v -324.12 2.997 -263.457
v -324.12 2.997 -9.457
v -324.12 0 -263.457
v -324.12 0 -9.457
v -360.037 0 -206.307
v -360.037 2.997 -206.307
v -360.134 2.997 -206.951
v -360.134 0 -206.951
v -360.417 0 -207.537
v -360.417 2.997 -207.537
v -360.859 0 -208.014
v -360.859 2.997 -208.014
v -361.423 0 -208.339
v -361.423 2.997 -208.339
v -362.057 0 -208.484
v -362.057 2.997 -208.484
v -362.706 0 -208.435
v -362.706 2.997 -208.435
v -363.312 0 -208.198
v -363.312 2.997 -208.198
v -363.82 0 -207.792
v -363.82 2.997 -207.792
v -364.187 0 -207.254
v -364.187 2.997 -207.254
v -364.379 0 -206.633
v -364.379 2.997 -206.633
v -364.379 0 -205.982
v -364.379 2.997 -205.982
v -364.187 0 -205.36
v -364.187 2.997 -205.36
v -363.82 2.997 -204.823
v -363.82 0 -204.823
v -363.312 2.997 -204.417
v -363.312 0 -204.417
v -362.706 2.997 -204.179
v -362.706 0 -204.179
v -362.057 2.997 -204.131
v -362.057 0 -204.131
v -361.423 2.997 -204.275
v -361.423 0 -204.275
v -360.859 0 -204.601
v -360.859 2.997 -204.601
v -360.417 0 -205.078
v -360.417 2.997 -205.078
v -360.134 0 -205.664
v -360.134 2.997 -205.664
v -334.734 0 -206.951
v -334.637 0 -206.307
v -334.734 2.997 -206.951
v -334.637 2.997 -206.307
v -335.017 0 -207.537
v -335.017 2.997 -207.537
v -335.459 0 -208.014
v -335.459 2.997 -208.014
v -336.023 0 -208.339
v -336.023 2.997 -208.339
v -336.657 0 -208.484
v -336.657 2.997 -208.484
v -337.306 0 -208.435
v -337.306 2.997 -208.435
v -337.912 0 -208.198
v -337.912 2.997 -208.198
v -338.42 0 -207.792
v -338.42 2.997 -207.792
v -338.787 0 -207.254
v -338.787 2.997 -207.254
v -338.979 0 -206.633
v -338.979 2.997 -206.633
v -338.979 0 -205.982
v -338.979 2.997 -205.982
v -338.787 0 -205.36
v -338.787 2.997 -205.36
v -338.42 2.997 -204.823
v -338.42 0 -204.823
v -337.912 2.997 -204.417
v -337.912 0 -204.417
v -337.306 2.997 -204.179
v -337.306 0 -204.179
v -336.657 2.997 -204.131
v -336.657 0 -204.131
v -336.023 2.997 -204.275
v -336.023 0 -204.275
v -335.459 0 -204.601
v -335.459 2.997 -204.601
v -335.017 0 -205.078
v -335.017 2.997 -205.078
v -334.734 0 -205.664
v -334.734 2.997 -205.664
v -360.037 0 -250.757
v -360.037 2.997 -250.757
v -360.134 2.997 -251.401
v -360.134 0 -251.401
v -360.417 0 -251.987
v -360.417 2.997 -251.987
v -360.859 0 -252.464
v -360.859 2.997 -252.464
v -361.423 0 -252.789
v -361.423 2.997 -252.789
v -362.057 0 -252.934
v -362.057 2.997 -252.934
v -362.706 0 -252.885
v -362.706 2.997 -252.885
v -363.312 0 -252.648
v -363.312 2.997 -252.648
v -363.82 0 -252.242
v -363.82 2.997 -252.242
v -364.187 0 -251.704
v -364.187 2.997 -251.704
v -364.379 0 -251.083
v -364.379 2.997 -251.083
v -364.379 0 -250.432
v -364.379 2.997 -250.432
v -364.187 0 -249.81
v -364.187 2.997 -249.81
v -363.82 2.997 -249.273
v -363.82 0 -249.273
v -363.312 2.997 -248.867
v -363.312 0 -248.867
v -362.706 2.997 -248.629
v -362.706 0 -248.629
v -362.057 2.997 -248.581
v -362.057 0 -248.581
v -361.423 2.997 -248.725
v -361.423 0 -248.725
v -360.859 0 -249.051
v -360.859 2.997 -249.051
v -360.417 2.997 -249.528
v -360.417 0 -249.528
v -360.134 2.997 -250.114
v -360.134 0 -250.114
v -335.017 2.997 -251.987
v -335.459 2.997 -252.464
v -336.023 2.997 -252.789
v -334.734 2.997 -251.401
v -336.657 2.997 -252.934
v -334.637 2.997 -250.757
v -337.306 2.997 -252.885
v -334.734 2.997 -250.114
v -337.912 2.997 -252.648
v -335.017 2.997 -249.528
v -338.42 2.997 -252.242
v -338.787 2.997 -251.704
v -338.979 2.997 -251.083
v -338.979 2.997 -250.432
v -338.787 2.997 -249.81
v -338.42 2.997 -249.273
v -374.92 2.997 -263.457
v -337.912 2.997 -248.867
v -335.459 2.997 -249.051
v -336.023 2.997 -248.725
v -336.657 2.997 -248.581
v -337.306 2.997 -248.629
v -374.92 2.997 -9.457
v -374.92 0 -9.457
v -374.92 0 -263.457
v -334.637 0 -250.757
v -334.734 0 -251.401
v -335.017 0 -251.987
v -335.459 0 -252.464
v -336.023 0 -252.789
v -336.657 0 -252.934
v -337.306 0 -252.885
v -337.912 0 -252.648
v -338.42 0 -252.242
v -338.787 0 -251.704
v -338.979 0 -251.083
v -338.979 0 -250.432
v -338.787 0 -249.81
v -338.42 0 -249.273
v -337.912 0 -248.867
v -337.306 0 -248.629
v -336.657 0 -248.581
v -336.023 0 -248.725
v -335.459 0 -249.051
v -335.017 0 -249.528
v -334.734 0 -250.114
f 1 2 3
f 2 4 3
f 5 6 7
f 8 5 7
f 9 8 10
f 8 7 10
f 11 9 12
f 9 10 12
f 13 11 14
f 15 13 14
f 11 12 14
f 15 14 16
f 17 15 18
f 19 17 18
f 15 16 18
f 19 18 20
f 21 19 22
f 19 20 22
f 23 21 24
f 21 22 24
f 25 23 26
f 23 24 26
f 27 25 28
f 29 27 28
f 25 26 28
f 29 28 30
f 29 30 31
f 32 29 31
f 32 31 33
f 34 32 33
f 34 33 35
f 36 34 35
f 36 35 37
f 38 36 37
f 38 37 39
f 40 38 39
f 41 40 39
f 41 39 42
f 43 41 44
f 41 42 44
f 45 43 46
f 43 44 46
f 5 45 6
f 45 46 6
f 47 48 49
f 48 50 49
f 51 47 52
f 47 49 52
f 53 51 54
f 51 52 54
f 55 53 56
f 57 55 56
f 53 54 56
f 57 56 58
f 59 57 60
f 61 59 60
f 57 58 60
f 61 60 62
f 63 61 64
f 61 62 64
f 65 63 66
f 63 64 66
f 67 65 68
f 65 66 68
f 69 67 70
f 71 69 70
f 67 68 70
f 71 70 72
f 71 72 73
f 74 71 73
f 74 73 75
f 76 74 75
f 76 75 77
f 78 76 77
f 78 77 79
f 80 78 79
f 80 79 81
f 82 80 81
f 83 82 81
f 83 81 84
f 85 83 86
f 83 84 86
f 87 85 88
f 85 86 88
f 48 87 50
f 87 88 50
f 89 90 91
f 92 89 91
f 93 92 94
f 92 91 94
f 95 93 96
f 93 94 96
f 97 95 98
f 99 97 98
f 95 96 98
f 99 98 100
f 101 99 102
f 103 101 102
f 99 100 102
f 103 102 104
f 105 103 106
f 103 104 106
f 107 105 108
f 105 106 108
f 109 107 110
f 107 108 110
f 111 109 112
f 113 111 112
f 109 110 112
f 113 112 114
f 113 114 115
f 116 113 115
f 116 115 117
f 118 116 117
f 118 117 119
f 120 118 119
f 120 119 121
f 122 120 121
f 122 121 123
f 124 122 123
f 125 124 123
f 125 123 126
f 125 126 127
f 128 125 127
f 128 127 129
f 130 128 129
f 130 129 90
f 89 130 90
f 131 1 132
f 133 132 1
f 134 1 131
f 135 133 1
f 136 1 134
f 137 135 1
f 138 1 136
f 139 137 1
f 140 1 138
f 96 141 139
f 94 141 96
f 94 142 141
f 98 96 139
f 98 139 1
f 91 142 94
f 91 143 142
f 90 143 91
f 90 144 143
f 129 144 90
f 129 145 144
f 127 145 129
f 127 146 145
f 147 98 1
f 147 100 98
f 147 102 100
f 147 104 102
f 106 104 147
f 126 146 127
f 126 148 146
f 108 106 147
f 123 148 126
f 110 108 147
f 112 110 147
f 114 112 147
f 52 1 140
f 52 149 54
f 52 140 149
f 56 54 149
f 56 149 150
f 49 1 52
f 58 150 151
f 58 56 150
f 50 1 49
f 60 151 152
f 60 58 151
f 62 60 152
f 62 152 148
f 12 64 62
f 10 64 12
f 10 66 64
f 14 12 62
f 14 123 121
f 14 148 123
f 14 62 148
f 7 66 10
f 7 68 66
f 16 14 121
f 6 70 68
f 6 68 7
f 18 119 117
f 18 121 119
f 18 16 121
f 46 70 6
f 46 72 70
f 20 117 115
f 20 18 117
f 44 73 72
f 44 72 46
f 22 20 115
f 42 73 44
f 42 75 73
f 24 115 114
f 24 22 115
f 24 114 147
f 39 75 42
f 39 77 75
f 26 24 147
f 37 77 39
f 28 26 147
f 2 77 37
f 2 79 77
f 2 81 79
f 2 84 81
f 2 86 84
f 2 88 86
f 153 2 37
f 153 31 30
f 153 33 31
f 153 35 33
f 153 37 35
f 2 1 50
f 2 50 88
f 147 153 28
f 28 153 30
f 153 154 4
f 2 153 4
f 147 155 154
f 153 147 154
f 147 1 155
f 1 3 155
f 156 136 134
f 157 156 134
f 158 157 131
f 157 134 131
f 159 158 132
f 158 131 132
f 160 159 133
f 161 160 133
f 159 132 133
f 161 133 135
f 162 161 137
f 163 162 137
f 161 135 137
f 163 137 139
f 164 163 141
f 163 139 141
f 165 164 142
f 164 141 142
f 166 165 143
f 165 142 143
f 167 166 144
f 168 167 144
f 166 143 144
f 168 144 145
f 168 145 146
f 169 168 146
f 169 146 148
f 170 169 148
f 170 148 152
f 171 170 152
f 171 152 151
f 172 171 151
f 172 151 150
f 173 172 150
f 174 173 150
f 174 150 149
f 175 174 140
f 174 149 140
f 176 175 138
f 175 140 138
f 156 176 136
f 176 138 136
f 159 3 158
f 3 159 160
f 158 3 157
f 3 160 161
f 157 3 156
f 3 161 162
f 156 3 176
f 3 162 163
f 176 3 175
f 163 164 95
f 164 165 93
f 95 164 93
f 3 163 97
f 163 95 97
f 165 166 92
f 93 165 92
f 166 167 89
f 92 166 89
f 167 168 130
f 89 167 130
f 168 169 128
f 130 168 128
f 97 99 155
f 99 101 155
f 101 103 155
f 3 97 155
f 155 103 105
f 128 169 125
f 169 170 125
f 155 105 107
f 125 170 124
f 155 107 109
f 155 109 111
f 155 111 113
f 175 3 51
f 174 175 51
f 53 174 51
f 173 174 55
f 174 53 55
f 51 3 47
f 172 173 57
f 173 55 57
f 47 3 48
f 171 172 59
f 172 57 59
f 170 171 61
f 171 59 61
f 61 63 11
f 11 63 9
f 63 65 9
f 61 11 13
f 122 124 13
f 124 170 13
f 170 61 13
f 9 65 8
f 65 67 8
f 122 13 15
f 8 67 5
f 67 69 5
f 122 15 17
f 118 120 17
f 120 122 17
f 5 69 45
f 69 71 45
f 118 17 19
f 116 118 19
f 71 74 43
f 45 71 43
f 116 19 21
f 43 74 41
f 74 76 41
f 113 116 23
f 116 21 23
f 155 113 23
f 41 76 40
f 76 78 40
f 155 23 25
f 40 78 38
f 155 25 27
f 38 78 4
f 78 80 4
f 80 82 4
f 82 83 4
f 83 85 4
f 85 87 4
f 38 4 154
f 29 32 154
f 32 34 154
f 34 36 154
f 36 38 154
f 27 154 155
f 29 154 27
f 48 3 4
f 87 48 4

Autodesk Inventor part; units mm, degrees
ref_plane "YZ Plane" through (0, 0, 0) normal (1, 0, 0) x (0, 1, 0)
ref_plane "XZ Plane" through (0, 0, 0) normal (0, 1, 0) x (-1, 0, 0)
ref_plane "XY Plane" through (0, 0, 0) normal (0, 0, 1) x (1, 0, 0)
sketch "Sketch1" plane through (0, 0, 0) normal (0, 1, 0) x (-1, 0, 0)
  line L0 (374.9202, -9.4574) -> (324.1202, -9.4574)
  line L1 (324.1202, -9.4574) -> (324.1202, -263.4574)
  line L2 (324.1202, -263.4574) -> (374.9202, -263.4574)
  line L3 (374.9202, -263.4574) -> (374.9202, -9.4574)
  point P0 (0, 0)
  dimension "d0" = 254
  dimension "d1" = 50.8
extrude "Extrusion1" add sketch "Sketch1" along normal blind 2.9972
sketch "Sketch2" plane through (0, 2.9972, 0) normal (0, 1, 0) x (1, 0, 0)
  line L0 (-336.8202, 206.3074) -> (-362.2202, 206.3074) construction
  line L1 (-362.2202, 206.3074) -> (-362.2202, 250.7574) construction
  line L2 (-362.2202, 250.7574) -> (-336.8202, 250.7574) construction
  line L3 (-336.8202, 250.7574) -> (-336.8202, 206.3074) construction
  line L4 (-336.8202, 206.3074) -> (-362.2202, 250.7574) construction
  line L5 (-362.2202, 206.3074) -> (-336.8202, 250.7574) construction
  line L6 (-324.1202, 263.4574) -> (-374.9202, 263.4574) projected
  line L7 (-349.5202, 228.5324) -> (-349.5202, 263.4574) construction
  circle A0 centre (-362.2202, 250.7574) radius 2.1828
  circle A1 centre (-336.8202, 250.7574) radius 2.1828
  circle A2 centre (-336.8202, 206.3074) radius 2.1828
  circle A3 centre (-362.2202, 206.3074) radius 2.1828
  point P0 (0, 0)
  dimension "d4" = 25.4
  dimension "d5" = 44.45
  dimension "d6" = 12.7
  dimension "d7" = 4.3656
extrude "Extrusion2" cut sketch "Sketch2" against normal through all
properties part number "10x2 Lexan" material "Polycarbonate, Clear"
